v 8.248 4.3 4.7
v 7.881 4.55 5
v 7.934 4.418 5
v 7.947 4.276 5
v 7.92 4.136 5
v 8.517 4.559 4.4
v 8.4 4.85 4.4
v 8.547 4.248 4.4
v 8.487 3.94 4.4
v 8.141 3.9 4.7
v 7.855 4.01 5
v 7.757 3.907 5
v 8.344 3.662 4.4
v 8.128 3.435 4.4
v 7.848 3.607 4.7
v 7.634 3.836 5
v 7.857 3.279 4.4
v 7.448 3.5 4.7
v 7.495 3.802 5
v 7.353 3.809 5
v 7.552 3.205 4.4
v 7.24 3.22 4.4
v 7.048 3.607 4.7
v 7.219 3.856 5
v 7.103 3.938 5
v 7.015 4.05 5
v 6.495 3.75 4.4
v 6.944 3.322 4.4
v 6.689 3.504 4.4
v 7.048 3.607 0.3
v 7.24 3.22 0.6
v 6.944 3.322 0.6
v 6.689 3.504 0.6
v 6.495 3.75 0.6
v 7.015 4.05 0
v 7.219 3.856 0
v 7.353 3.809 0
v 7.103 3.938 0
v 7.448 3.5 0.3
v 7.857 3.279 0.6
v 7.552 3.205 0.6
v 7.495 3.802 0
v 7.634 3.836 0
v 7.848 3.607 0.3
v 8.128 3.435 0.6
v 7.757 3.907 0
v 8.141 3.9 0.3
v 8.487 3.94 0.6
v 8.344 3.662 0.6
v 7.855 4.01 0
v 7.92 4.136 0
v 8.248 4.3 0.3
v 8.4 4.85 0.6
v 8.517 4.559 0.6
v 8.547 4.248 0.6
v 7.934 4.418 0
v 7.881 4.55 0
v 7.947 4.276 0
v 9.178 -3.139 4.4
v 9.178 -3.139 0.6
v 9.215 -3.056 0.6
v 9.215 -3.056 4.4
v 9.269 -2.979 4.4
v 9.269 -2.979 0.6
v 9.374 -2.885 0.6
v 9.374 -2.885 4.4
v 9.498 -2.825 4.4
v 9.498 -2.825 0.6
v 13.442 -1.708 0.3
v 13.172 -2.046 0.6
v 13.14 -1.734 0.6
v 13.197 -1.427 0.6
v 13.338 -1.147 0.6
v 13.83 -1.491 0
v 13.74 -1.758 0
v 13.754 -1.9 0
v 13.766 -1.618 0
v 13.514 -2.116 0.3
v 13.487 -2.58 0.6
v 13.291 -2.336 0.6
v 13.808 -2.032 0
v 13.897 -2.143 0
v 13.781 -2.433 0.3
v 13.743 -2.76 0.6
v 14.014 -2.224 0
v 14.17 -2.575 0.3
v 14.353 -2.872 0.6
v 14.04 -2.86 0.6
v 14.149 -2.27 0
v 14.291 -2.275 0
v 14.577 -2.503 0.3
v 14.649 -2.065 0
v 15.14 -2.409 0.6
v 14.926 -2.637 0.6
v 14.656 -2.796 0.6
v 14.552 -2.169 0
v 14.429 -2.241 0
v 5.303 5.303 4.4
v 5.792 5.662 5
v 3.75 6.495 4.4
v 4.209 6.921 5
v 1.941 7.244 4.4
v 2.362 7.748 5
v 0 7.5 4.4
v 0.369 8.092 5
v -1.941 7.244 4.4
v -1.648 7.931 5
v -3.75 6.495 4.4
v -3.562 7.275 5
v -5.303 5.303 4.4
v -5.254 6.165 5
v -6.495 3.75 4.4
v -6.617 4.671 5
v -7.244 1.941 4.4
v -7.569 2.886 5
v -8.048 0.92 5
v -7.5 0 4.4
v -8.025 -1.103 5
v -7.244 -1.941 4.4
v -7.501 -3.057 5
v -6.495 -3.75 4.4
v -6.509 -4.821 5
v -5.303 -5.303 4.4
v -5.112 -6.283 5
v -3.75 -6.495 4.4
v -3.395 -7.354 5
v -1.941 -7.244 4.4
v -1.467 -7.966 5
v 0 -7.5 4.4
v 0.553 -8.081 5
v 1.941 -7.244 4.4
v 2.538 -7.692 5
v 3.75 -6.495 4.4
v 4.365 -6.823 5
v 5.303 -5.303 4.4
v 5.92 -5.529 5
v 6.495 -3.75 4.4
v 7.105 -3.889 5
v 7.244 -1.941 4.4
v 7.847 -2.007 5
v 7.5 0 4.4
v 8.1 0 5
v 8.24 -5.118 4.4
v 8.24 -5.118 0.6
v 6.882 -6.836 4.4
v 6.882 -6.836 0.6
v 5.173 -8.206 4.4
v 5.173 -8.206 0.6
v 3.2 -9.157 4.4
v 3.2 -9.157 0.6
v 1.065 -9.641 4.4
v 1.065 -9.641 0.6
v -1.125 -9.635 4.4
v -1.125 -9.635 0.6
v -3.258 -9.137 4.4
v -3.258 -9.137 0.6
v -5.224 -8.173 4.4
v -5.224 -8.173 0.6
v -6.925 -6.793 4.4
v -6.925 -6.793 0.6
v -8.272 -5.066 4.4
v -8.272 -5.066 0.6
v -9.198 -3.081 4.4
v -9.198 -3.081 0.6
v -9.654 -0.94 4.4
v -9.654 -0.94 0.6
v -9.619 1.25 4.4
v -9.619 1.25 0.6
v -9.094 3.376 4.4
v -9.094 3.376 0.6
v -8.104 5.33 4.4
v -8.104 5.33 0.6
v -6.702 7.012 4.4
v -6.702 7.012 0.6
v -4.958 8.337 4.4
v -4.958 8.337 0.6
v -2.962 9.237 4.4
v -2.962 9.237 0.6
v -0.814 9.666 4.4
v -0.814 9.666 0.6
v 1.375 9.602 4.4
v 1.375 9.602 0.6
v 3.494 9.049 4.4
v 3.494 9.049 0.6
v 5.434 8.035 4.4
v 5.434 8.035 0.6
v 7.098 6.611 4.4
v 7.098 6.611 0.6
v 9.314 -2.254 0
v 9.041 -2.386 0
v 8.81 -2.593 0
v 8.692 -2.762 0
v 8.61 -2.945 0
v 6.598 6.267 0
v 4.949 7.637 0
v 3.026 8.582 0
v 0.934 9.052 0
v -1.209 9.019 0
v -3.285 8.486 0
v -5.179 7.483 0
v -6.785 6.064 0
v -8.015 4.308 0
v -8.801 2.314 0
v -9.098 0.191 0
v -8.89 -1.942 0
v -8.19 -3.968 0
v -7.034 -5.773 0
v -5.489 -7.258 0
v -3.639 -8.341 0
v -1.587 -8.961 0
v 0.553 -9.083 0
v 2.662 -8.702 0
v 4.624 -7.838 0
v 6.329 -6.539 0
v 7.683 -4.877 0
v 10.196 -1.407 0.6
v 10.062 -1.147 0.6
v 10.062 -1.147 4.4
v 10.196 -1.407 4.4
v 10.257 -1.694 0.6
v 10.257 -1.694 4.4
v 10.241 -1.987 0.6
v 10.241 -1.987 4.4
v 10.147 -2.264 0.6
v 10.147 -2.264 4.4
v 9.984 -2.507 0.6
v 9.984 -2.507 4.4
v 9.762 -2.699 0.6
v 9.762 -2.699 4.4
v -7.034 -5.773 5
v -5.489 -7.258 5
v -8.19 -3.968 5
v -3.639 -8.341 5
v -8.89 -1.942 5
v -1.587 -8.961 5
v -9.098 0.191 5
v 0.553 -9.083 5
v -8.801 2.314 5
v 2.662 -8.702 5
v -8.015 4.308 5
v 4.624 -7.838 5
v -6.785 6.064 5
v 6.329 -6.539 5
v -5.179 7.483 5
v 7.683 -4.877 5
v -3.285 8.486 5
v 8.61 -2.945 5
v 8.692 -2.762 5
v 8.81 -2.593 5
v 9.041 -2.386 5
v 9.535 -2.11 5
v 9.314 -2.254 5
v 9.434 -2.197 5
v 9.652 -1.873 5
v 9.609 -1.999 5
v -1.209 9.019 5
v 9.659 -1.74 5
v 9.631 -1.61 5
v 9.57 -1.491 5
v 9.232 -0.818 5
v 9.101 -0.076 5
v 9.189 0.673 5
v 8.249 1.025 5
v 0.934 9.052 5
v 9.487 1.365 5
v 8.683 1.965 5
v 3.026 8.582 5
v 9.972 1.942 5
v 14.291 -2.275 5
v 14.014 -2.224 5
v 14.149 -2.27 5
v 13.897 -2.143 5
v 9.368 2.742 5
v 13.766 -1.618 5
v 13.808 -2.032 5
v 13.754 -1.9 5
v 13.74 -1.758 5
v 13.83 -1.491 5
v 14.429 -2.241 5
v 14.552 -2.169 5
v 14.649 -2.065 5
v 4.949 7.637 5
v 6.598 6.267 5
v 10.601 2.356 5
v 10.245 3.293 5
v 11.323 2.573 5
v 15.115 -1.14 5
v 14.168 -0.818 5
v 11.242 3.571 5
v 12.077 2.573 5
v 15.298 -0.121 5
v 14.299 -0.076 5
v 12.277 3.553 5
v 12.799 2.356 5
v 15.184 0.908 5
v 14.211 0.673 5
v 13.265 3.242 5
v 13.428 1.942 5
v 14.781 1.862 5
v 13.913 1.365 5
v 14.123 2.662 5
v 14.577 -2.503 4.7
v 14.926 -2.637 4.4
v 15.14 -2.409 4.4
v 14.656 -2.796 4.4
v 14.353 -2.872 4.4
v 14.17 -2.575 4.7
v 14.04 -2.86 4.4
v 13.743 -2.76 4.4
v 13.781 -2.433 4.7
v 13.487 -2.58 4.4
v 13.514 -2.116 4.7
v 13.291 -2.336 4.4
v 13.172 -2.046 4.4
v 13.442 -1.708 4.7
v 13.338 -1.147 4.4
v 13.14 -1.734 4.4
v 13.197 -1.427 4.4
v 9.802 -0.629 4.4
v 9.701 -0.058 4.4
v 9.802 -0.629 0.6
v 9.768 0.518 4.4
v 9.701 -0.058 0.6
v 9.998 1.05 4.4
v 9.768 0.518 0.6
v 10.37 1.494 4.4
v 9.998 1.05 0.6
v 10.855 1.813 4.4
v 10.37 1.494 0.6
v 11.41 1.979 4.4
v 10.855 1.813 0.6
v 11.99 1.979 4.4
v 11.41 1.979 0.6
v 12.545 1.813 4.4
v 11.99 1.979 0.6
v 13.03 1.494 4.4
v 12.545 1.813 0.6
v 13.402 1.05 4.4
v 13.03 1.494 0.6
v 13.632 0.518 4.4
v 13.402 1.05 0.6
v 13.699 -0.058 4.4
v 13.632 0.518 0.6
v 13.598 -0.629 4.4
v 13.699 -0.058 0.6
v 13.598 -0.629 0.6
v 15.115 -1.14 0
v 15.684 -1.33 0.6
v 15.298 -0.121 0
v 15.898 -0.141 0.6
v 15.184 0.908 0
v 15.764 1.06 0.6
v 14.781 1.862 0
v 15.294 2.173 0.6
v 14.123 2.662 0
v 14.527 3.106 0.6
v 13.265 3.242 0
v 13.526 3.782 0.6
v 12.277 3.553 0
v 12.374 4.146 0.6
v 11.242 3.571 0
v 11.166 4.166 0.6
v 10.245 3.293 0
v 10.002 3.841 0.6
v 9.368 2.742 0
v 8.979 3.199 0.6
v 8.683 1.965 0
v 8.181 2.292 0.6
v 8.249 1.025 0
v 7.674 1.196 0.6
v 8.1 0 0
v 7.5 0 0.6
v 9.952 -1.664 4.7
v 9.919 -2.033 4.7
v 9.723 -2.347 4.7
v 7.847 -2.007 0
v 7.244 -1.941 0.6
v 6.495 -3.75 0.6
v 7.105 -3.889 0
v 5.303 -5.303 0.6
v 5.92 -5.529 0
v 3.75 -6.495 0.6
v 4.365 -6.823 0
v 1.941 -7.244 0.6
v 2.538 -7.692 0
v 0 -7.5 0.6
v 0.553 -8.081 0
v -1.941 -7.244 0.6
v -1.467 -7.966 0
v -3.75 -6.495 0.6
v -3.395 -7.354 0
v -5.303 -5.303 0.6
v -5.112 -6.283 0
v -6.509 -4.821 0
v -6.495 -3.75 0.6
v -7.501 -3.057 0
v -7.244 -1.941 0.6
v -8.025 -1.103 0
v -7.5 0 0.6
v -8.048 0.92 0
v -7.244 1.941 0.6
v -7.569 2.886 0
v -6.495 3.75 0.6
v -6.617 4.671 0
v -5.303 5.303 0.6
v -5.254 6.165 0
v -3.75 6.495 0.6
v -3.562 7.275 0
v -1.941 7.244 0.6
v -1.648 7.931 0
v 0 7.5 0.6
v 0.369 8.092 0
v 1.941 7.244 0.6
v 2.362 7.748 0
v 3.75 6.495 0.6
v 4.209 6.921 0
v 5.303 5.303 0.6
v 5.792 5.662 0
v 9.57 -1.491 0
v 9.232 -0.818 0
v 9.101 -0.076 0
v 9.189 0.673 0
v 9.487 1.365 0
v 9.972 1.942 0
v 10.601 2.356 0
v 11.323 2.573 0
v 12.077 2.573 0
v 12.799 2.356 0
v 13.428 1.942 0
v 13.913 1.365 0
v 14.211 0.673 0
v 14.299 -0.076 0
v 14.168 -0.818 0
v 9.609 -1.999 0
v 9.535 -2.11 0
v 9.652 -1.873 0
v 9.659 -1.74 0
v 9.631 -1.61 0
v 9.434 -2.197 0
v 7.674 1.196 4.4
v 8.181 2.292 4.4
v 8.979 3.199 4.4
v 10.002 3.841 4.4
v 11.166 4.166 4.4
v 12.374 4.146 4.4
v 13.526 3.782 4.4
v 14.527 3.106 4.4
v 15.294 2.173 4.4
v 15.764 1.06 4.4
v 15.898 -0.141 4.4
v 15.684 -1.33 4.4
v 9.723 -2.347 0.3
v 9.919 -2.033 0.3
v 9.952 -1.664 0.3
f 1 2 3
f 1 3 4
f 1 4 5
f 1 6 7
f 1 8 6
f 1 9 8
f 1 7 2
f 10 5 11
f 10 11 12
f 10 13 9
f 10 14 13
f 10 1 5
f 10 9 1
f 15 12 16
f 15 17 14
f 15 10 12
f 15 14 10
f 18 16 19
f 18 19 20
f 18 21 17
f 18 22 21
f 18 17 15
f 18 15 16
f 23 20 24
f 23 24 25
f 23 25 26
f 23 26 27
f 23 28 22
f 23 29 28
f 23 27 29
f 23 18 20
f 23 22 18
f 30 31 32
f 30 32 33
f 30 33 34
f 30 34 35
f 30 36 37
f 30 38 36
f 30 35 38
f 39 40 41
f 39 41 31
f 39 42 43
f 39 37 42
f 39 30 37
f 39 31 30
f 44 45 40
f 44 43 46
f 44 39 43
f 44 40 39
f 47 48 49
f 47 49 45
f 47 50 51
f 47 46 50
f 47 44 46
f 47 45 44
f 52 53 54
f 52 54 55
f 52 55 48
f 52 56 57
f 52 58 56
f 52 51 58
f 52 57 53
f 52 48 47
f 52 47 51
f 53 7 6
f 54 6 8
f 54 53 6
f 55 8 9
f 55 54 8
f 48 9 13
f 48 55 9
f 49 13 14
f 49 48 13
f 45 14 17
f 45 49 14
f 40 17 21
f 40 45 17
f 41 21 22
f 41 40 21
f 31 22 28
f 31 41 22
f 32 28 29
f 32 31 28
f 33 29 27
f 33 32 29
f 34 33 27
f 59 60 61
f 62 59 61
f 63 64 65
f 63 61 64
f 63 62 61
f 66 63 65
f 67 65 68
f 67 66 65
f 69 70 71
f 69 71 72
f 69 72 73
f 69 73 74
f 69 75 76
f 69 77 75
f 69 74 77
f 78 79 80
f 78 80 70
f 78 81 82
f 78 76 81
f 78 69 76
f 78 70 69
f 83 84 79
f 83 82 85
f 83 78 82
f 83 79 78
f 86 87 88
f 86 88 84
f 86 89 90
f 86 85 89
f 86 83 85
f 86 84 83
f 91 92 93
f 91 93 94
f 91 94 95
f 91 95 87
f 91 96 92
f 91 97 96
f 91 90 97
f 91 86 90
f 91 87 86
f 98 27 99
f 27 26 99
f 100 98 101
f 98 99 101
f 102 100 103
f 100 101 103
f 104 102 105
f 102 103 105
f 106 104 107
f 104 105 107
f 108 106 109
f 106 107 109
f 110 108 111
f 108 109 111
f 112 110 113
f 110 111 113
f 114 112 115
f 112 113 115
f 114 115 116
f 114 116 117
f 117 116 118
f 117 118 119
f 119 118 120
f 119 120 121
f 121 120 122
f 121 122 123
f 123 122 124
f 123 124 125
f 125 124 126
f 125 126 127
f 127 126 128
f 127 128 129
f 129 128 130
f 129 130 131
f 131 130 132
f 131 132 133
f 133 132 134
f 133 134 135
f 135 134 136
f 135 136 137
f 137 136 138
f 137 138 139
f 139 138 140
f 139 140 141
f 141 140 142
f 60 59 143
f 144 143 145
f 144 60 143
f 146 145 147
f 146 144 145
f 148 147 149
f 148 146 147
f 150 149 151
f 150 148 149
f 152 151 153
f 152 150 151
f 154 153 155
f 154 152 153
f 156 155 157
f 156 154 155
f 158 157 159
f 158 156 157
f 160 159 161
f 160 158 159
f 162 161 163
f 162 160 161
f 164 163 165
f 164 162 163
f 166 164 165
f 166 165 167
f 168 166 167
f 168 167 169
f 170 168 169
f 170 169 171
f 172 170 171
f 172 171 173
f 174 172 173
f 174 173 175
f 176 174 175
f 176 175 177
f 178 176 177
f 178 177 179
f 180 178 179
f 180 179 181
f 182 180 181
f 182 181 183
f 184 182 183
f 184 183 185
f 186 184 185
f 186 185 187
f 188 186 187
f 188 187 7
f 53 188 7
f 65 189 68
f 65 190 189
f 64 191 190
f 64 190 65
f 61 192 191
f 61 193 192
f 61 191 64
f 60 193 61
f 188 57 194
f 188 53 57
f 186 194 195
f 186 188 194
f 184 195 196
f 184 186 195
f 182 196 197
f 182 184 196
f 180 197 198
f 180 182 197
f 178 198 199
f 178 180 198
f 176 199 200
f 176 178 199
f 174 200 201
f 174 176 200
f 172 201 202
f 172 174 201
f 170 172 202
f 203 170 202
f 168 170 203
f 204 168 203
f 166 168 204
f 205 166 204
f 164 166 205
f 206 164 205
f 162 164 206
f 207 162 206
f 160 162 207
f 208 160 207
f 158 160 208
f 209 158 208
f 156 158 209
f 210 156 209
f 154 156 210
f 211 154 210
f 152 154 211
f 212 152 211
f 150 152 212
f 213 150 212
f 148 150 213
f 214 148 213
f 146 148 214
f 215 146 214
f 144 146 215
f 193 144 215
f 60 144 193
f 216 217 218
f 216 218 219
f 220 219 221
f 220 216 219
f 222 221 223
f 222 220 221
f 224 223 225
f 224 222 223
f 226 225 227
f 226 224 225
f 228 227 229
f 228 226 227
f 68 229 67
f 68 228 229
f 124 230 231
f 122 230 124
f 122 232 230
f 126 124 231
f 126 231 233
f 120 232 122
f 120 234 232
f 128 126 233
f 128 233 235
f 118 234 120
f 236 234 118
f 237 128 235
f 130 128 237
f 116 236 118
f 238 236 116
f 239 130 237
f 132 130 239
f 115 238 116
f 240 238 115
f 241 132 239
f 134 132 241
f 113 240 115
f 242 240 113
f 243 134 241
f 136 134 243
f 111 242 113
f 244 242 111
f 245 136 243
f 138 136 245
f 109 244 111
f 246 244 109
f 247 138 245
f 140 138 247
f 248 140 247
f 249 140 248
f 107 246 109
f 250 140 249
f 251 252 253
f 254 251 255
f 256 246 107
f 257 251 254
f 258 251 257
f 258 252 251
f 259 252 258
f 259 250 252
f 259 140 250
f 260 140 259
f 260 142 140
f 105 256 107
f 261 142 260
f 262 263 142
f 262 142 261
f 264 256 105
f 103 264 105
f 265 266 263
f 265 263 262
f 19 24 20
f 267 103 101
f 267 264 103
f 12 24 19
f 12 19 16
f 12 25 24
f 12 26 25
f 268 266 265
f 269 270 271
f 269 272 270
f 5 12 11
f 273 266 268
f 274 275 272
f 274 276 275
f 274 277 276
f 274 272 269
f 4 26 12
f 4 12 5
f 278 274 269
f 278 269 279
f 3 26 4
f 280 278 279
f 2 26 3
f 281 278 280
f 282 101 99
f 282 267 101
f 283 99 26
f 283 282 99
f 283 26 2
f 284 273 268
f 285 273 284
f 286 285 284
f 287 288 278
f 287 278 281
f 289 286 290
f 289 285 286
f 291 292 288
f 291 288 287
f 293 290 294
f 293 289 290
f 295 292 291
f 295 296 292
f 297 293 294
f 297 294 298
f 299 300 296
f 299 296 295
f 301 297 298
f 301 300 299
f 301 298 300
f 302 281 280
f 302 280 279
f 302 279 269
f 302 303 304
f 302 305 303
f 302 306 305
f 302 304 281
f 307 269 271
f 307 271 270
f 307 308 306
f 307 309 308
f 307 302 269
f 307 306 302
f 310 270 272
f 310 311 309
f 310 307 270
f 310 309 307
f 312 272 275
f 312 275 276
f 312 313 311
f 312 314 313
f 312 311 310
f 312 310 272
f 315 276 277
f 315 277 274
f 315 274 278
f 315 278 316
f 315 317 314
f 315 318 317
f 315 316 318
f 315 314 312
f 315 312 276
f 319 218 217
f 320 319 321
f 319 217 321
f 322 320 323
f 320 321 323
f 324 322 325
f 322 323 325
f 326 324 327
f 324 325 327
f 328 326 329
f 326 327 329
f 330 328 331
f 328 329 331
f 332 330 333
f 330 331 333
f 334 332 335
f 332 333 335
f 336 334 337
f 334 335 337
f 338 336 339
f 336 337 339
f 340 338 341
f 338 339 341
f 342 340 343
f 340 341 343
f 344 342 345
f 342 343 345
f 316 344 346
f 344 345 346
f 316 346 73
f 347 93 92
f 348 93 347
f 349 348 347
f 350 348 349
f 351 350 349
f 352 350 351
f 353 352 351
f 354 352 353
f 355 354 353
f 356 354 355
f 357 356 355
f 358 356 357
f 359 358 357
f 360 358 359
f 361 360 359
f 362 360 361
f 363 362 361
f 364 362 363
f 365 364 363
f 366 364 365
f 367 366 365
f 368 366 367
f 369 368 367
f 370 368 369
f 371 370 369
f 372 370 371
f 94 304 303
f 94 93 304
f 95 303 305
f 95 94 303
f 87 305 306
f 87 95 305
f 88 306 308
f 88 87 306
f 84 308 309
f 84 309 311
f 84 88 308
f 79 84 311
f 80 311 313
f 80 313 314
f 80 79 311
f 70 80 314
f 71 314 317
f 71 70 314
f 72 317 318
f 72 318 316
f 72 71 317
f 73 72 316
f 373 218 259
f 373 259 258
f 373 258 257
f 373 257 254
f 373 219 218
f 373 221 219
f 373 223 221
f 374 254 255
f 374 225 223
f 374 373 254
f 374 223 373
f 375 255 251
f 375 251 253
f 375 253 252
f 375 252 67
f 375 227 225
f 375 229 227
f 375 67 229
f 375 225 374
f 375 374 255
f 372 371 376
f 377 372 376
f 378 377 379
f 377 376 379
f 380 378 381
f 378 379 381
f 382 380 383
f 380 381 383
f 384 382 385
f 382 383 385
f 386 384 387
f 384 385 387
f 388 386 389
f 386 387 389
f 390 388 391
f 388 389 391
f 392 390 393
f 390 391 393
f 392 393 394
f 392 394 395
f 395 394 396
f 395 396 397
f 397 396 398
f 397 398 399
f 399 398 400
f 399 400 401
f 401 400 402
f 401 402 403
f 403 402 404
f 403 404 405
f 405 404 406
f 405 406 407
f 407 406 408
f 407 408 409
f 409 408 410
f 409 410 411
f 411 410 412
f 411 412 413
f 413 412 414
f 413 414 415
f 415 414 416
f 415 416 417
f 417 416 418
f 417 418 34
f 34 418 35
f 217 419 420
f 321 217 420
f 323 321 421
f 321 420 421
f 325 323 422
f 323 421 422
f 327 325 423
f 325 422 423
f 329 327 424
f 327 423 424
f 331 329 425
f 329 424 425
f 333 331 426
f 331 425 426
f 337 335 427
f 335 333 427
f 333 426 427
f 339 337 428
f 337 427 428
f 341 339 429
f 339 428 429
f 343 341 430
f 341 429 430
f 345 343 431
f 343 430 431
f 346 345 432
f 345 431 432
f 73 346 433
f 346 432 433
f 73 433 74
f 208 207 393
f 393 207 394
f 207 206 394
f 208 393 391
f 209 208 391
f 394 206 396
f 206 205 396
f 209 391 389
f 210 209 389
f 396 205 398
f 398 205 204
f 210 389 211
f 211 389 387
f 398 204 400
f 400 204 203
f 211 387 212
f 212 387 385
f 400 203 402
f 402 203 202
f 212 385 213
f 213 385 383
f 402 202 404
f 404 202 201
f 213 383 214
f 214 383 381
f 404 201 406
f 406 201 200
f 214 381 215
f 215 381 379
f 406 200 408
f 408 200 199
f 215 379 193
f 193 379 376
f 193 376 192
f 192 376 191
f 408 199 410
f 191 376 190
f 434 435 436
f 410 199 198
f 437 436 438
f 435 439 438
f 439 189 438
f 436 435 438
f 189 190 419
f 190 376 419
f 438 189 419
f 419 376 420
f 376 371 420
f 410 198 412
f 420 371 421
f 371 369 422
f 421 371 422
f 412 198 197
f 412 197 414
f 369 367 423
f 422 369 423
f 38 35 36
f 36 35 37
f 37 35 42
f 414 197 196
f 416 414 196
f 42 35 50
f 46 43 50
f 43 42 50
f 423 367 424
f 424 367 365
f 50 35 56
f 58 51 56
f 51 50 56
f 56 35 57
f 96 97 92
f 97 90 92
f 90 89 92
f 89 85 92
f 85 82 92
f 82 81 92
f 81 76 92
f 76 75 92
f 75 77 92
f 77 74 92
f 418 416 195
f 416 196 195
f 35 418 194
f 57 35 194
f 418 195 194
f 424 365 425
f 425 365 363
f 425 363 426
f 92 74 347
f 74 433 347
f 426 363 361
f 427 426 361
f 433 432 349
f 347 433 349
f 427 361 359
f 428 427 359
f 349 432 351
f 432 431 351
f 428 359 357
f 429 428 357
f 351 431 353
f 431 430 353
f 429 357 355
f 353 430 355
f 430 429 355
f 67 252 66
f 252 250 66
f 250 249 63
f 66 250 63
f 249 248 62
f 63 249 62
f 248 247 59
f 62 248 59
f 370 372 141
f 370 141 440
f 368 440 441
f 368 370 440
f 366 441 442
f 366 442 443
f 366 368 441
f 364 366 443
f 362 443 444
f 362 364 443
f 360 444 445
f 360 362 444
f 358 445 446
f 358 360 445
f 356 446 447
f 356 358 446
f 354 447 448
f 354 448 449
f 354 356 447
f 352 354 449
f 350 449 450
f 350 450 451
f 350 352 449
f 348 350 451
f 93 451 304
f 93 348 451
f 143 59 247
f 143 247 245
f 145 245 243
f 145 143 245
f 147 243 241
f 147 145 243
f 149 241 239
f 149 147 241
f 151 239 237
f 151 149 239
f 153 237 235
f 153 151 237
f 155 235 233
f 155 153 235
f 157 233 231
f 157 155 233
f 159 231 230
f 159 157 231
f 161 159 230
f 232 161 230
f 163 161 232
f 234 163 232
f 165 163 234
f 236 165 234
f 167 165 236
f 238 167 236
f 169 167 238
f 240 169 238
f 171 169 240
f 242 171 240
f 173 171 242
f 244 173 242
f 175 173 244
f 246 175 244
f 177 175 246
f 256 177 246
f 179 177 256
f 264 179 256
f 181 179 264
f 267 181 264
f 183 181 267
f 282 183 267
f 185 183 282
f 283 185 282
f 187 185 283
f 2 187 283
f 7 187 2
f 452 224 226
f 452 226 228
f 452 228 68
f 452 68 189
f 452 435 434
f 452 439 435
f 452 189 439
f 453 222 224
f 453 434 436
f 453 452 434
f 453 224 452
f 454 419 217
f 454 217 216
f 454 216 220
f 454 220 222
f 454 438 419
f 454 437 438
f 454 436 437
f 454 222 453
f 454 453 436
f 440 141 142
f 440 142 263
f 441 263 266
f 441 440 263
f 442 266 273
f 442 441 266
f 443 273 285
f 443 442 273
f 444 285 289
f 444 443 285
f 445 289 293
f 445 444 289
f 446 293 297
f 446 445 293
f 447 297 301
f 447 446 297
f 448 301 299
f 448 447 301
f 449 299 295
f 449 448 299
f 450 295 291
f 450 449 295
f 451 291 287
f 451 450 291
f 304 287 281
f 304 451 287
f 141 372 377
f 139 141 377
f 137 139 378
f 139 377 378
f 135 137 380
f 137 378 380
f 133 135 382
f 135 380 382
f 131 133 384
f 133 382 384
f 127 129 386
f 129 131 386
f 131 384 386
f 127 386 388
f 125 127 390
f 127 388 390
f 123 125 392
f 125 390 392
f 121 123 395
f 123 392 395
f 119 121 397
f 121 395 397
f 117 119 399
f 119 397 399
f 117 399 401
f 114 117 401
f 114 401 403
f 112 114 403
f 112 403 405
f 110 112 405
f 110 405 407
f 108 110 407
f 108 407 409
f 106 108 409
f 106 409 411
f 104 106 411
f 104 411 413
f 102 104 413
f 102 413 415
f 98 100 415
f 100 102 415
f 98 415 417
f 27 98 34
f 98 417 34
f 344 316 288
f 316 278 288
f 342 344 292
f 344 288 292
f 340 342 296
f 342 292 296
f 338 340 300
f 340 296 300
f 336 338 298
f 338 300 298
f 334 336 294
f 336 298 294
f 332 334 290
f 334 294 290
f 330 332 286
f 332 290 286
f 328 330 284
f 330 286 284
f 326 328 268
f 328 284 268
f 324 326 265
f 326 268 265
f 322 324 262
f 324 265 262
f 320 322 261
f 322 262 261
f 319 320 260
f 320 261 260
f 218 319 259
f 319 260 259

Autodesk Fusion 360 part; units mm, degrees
sketch "Sketch1" plane through (0, 0, 0) normal (0, 0, 1) x (1, 0, 0)
  circle A0 centre (0, 0) radius 7.5
  circle A1 centre (0, 0) radius 9.7
  circle A2 centre (11.7, 0) radius 2
  circle A3 centre (11.7, 0) radius 4.2
  line L0 (-19.1275, 0) -> (19.1275, 0) construction
  line L1 (0, 53.4087) -> (0, -53.4087) construction
  circle A4 centre (9.1606, -1.7781) radius 1.1
  circle A5 centre (14.2394, -1.7781) radius 1.1
  circle A6 centre (7.4478, 4.3) radius 1.1
  line L2 (0, 0) -> (7.4478, 4.3) construction
  line L3 (0, 0) -> (11.7, 0) construction
  line L4 (9.1606, -1.7781) -> (11.7, 0) construction
  line L5 (14.2394, -1.7781) -> (11.7, 0) construction
  line L6 (9.1606, -1.7781) -> (14.2394, -1.7781) construction
  dimension "d5_1_1_2_1_1" = 15
  dimension "d6_1_1_2_1_1" = 2.2
  dimension "d7_1_1_2_1_1" = 4
  dimension "d9_1_1_2_1_1" = 2.2
  dimension "d17_1_1_2_1_1" = 2.2
  dimension "d18_1_1_2_1_1" = 2.2
  dimension "d23_1_1_2_1_1" = 2.2
  dimension "d32_1_1" = 110
  dimension "d34_1_1" = 90
  dimension "d36_1" = 30
  dimension "d47" = 5.0787
extrude "Extrude1" add sketch "Sketch1" along normal blind 5 contours A0 A1 A3 A6 | A1 A3 A4 | A6 | A1 A2 A3 A5 | A1 A3 A4 | A1 A4 | A1 A2 A4 | A1 A4 | A5 picked at (6.1986, 5.9178)
fillet "Fillet1" radius 0.5 1 edges at (9.2647, -2.8732, 2.5)
chamfer "Chamfer2" distance 0.6 angle 45 16 edges at (7.9978, 3.3474, 5) (-9.6544, -0.9396, 5) (9.3007, -2.9443, 5) (10.2033, -2.1285, 5) (11.7, 2, 5) (13.6084, -2.6792, 5) (12.963, 4.0056, 5) (-7.2444, -1.9411, 5) (10.2033, -2.1285, 0) (11.7, 2, 0) (13.6084, -2.6792, 0) (12.963, 4.0056, 0) (-7.2444, -1.9411, 0) (7.9978, 3.3474, 0) (-9.6544, -0.9396, 0) (9.3007, -2.9443, 0)
equation "d6_1_1_2_1_1 = ClipWall"
equation "d9_1_1_2_1_1 = ClipWall"
equation "d17_1_1_2_1_1 = ClipWall"
equation "d18_1_1_2_1_1 = ClipWall"
equation "d21_1_1_2_1_1 = Thickness"
equation "d23_1_1_2_1_1 = ClipWall"
equation "ClipWall = 2.2 mm"
equation "Thickness = 5 mm"
